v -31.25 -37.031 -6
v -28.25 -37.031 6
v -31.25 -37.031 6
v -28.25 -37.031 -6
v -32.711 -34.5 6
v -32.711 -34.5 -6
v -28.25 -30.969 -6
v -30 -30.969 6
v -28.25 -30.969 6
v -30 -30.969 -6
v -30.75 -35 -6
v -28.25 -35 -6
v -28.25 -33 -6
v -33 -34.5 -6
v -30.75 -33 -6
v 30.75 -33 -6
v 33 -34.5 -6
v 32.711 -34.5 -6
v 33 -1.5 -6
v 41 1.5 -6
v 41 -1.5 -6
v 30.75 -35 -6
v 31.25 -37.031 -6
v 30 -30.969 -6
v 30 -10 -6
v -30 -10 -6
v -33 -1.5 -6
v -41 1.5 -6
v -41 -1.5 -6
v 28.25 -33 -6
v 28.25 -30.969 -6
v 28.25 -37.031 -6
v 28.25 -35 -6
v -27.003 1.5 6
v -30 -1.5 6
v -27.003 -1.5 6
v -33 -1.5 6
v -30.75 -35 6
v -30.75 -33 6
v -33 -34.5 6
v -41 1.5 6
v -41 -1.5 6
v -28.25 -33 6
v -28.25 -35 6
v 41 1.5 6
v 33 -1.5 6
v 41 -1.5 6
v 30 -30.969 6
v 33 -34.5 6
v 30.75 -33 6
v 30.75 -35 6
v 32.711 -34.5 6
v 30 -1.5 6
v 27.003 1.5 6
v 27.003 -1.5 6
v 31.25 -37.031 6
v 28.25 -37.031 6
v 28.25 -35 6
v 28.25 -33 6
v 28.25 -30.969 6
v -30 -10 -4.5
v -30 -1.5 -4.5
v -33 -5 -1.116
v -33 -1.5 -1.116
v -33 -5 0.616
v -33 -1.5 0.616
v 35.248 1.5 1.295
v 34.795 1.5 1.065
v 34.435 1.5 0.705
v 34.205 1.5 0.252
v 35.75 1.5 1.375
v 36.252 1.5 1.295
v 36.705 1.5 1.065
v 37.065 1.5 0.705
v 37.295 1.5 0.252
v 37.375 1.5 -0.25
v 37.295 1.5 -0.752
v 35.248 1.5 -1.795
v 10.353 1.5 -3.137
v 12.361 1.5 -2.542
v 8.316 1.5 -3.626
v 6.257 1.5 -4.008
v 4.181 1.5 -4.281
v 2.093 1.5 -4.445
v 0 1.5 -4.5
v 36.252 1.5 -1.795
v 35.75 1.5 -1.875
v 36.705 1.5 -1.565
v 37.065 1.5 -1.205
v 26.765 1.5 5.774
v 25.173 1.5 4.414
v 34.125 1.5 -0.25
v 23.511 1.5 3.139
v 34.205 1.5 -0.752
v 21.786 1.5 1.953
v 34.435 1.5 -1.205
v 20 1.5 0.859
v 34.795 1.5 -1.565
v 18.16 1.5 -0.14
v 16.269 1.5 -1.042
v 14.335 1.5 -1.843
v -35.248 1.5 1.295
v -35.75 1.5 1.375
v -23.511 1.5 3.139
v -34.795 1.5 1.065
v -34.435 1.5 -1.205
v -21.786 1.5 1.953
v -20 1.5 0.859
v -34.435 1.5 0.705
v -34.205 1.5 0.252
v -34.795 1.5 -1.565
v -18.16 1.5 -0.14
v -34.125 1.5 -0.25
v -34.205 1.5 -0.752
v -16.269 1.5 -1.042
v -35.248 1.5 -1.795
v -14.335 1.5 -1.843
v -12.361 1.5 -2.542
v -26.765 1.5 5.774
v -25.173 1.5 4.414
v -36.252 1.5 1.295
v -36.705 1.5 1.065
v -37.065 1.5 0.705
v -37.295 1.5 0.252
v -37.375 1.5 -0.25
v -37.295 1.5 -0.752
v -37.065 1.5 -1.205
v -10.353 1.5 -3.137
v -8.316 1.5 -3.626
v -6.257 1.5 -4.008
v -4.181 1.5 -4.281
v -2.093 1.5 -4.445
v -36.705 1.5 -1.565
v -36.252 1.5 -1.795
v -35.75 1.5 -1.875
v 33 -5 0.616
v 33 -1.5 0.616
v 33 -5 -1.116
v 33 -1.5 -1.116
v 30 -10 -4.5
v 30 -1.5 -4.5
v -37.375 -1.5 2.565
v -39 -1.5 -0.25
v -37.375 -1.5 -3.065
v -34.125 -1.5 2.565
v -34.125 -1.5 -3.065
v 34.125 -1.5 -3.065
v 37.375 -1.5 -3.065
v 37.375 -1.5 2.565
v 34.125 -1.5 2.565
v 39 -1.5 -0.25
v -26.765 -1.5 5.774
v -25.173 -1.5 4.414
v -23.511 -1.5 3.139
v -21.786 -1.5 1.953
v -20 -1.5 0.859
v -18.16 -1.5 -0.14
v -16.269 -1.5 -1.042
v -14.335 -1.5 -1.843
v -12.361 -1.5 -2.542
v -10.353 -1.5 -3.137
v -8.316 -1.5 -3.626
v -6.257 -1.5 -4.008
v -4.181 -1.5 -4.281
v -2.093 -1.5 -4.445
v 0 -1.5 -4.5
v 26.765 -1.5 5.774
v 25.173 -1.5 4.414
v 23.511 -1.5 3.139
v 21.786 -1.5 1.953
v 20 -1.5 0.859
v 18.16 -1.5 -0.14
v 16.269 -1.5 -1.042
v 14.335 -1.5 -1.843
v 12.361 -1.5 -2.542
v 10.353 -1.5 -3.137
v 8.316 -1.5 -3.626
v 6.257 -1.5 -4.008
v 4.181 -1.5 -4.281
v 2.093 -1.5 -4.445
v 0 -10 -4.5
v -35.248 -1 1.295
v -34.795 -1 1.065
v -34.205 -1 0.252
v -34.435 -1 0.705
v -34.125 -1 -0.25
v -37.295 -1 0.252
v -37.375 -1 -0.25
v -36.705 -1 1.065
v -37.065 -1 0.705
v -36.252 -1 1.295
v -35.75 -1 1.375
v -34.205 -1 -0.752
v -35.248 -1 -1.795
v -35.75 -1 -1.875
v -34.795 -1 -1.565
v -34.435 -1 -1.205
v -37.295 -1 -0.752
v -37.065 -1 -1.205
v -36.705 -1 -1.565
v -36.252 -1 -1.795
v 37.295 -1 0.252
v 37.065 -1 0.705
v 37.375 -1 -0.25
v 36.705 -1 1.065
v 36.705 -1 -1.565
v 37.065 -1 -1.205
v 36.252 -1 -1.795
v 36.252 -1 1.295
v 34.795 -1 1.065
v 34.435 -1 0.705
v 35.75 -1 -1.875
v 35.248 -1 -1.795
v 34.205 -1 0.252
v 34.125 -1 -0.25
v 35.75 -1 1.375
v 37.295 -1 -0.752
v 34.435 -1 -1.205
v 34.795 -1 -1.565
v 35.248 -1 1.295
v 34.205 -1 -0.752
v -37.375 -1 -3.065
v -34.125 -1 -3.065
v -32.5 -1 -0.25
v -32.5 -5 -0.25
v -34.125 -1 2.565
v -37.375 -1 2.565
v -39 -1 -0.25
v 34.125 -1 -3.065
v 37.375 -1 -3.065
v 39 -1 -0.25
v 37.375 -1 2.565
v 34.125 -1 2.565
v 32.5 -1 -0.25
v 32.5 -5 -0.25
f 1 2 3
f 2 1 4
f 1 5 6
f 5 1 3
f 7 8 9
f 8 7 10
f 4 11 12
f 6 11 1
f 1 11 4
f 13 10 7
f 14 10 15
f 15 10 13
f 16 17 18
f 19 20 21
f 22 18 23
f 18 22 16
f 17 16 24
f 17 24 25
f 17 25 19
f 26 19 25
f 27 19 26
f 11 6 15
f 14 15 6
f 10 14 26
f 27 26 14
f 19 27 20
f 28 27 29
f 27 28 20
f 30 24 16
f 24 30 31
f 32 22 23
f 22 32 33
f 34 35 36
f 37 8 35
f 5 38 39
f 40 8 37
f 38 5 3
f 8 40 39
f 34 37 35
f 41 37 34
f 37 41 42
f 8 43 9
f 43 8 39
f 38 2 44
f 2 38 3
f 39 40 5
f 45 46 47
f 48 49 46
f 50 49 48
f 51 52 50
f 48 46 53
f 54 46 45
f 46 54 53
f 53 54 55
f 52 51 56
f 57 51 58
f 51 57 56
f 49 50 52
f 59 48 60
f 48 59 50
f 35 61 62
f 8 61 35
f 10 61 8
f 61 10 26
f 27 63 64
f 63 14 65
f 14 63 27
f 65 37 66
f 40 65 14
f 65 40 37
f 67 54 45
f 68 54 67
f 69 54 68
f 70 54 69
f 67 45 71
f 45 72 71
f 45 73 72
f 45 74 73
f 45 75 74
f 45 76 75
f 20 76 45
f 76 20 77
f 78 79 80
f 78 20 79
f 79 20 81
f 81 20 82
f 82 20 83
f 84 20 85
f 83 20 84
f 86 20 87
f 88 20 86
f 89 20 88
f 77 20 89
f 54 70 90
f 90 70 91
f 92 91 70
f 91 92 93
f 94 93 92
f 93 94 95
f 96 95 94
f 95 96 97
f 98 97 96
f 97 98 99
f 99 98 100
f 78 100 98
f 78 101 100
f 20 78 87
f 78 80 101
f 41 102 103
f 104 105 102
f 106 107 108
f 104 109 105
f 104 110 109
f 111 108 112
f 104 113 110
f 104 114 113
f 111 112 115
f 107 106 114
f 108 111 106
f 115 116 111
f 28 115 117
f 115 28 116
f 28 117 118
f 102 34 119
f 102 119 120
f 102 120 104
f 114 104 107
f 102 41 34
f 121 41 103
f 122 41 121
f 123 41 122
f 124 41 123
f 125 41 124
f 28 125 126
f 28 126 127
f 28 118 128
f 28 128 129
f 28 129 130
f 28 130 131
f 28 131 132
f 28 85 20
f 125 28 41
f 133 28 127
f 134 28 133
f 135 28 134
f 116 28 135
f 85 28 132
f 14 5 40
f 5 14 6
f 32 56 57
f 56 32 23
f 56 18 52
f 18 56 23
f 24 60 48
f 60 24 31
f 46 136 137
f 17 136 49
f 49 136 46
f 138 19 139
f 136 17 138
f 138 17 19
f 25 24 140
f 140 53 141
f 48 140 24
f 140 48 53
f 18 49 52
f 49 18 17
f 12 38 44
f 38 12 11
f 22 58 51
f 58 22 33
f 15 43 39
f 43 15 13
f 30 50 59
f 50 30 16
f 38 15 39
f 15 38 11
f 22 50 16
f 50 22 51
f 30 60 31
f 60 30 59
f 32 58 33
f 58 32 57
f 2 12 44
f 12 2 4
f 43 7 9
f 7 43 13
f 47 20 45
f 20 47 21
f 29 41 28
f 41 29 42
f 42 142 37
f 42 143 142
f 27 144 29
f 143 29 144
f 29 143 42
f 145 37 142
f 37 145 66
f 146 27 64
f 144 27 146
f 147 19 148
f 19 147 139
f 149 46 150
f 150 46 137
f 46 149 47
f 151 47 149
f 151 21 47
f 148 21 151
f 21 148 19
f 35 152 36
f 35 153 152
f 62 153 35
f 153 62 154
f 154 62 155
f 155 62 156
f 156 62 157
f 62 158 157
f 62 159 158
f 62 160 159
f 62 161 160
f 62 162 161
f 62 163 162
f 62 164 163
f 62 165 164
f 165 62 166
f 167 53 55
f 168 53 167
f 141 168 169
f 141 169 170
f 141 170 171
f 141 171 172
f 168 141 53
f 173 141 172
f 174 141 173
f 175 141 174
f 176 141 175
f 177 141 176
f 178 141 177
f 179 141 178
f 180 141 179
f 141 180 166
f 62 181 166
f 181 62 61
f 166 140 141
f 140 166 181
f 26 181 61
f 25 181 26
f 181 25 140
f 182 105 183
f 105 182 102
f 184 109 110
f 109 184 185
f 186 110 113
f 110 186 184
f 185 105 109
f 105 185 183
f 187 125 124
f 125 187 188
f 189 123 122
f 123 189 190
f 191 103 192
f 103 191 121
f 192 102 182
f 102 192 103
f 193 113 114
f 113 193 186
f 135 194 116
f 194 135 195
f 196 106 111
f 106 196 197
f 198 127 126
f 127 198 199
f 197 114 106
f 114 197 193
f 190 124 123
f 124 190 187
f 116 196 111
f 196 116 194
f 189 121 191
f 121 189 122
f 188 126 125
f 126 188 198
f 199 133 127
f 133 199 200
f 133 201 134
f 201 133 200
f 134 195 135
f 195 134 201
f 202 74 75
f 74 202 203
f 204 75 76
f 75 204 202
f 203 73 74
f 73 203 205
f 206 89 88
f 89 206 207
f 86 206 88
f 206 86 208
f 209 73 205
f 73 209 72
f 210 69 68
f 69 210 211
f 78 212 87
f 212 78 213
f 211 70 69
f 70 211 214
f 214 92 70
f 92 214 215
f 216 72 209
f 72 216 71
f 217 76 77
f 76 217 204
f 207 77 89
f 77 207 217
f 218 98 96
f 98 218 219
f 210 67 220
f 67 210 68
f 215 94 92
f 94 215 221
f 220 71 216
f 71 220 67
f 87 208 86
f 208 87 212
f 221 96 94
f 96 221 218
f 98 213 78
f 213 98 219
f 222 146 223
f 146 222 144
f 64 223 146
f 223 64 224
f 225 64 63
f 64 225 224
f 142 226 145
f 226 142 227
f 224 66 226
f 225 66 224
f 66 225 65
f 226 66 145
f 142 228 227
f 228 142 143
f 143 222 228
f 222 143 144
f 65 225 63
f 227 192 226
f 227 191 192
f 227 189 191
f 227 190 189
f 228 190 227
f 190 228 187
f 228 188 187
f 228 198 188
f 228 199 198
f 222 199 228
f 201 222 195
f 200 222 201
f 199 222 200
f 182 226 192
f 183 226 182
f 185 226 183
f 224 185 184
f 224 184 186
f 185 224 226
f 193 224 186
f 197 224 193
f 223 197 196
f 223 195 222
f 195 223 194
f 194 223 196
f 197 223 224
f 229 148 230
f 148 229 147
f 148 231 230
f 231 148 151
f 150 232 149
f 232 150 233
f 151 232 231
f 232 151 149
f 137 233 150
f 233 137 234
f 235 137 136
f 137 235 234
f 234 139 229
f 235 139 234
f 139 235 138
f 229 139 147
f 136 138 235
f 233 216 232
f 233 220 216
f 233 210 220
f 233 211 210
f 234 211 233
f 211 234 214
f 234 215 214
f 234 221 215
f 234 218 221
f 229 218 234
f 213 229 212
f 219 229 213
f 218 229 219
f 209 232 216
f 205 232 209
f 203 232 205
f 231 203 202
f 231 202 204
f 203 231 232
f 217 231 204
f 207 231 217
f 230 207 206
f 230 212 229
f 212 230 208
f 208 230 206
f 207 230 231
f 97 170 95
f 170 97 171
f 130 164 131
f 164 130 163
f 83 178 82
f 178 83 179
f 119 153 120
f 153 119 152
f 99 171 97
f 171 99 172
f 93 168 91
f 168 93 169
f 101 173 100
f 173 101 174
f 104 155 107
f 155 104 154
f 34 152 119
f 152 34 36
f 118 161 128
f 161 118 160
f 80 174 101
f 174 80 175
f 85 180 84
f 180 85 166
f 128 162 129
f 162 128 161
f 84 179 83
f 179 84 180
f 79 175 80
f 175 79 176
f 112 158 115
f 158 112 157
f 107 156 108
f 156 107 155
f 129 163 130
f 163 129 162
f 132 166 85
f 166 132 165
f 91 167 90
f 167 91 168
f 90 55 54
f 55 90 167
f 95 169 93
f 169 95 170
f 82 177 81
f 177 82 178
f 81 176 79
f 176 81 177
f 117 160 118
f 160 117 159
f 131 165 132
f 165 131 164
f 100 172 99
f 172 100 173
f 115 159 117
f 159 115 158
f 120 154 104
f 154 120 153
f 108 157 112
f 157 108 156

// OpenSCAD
// MOAB - MOther of All fan Brackets
// Design by Marius Gheorghescu, October 2013.
// Update log
// November 5th 2013: 
//  - fan cutout (and the screw holes) can be removed entirely now to produce spacers or PCB feet 
//  - hex nuts resize with screw size (need to vealidate in practice)
//  - cross-brace is configurable and can also be removed


// Typical values 40, 50, 60, 80. Set to 0 to not have a fan cutout.
fan_size = 80;

// Distance between two fan holes. Typical values: 32.00 for 40mm fan, 40.00 for 50mm fan, 50.00 for 60mm fan, 71.50 for 80mm fan, 105.00 for 120mm fan. Set to value larger than fan size to not have any screw holes
fan_hole_spacing = 71.5;

// Use 3.25mm for M3, 4.25mm for M4 and so on
screw_diameter = 3.25;

// width of the PCB. Common values: 60mm for RAMPS, 53.5mm for Arduino, 56mm for Raspberry Pi
pcb_width = 60.0;

// distance from bottom of the fan to PCB. Recommended value for RAMPS fuse clearance: 35mm
bracket_height = 36;

// how long the bracket needs to be, typically 10mm for mini brackets, or close to fan size for full brackets
bracket_length = 12;

// typically 2-4mm
bracket_thickness = 3.0;

// how tall is the cross brace that addds additional strength to the bracket, set to 0 to not have one
cross_bracket = 10;

// thickness of the pcb board
pcb_thickness = 2.0;

/* [Hidden] */

// how much to go over the PCB
lip_size = 1.75;

// effective width of the bracket at the top
bracket_width = max(pcb_width, fan_size - 4);

module legs()
{

    difference() {
        union() {

            // left clip
            color([0,0,.5])
            translate([-pcb_width/2 + .5, -bracket_height + 2, 0])
                rotate([0, 0, 180]) 
                    cylinder(r=3.5, h=bracket_length, $fn=6, center=true);

            // left leg
            color([0,0,1])
            translate([-pcb_width/2 - bracket_thickness, -bracket_height + bracket_thickness/2, -bracket_length/2])
                cube([bracket_thickness, bracket_height, bracket_length]);


            // right clip
            color([0,0,.5])
            translate([pcb_width/2 - .5, -bracket_height + 2, 0])
                 rotate([0, 0, 180]) 
                     cylinder(r=3.5, h=bracket_length, $fn=6, center=true);

            // right leg
            color([0,0,1])
           translate([pcb_width/2 , -bracket_height + bracket_thickness/2, -bracket_length/2])
                cube([bracket_thickness, bracket_height, bracket_length]);

        }

        // left cutout
       translate([-pcb_width/2 + 1.5, -bracket_height + 2, 0])
            rotate([0, 0, 180])
			   cube(size=[4.5,pcb_thickness,bracket_length+0.1], center=true);
                //cylinder(r=1.5, h=bracket_length + 0.1, $fn=6, center=true);

        // right cutout
       translate([pcb_width/2 - 1.5, -bracket_height + 2, 0])
            cube(size=[4.5,pcb_thickness,bracket_length+0.1], center=true);
            //cylinder(r=1.5, h=bracket_length + 0.1, $fn=6, center=true);

        // PCB lips clearance
        translate([0, -bracket_height + bracket_thickness + -.5,0])
            cube([pcb_width - 2*lip_size, 12, bracket_length + 0.1], center=true);

        // PCB
        translate([0, -bracket_height + 2, 0])
            cube([pcb_width, pcb_thickness, bracket_length + 0.1], center=true);

    }

}

module fan_mask()
{
    // M3 screw
    translate([-fan_hole_spacing/2, -fan_hole_spacing/2, 0])
        cylinder(r=screw_diameter/2, h=bracket_height, $fn=20, center=true);
    translate([fan_hole_spacing/2, -fan_hole_spacing/2, 0])
        cylinder(r=screw_diameter/2, h=bracket_height, $fn=20, center=true);
    translate([-fan_hole_spacing/2, fan_hole_spacing/2, 0])
        cylinder(r=screw_diameter/2, h=bracket_height, $fn=20, center=true);
    translate([fan_hole_spacing/2, fan_hole_spacing/2, 0])
        cylinder(r=screw_diameter/2, h=bracket_height, $fn=20, center=true);

    // M3 nuts
    translate([-fan_hole_spacing/2, -fan_hole_spacing/2, 0])
        cylinder(r=screw_diameter, h=4, $fn=6, center=true);
    translate([fan_hole_spacing/2, -fan_hole_spacing/2, 0])
        cylinder(r=screw_diameter, h=4, $fn=6, center=true);
    translate([-fan_hole_spacing/2, fan_hole_spacing/2, 0])
        cylinder(r=screw_diameter, h=4, $fn=6, center=true);
    translate([fan_hole_spacing/2, fan_hole_spacing/2, 0])
        cylinder(r=screw_diameter, h=4, $fn=6, center=true);

    // fan blade clearance
    difference() {
        cylinder(r=fan_size/2, h=bracket_height, $fn=120, center=true);

        // $TODO - add support around the screws if they are too close to the blades
        // also need to add support if the bracket is not wide (tall) enough 
    }
}


module bracket()
{
    difference() {
        union() {

            // fan base
            translate([0, 0, 0])
                cube([bracket_width + 2*bracket_thickness, bracket_thickness, bracket_length], center=true);

            // extra strength 
            color([1,.5,0])
            translate([0, -cross_bracket/2, -bracket_length/2 + bracket_thickness/4])
                cube([pcb_width + 1, cross_bracket, bracket_thickness/2], center=true);

            legs();
        }


        translate([0, -bracket_thickness, -bracket_length/2 + fan_size/2 + bracket_thickness/2])
        rotate([90,0,0])
            fan_mask();

        }
}


module assembly() 
{
    color([1,0,0])
    translate([0, 0, -fan_size/2])
        bracket();

    color([1,0,0])
    //translate([0, 0, fan_size/2])
    rotate([0,180,0])
        bracket();

    color([0,.5,0])
    translate([0, -bracket_height + 2, 0])
        cube([pcb_width - 1, 1.75, fan_size*1.5], center=true);

}

//assembly();
bracket();
//fan_mask();
